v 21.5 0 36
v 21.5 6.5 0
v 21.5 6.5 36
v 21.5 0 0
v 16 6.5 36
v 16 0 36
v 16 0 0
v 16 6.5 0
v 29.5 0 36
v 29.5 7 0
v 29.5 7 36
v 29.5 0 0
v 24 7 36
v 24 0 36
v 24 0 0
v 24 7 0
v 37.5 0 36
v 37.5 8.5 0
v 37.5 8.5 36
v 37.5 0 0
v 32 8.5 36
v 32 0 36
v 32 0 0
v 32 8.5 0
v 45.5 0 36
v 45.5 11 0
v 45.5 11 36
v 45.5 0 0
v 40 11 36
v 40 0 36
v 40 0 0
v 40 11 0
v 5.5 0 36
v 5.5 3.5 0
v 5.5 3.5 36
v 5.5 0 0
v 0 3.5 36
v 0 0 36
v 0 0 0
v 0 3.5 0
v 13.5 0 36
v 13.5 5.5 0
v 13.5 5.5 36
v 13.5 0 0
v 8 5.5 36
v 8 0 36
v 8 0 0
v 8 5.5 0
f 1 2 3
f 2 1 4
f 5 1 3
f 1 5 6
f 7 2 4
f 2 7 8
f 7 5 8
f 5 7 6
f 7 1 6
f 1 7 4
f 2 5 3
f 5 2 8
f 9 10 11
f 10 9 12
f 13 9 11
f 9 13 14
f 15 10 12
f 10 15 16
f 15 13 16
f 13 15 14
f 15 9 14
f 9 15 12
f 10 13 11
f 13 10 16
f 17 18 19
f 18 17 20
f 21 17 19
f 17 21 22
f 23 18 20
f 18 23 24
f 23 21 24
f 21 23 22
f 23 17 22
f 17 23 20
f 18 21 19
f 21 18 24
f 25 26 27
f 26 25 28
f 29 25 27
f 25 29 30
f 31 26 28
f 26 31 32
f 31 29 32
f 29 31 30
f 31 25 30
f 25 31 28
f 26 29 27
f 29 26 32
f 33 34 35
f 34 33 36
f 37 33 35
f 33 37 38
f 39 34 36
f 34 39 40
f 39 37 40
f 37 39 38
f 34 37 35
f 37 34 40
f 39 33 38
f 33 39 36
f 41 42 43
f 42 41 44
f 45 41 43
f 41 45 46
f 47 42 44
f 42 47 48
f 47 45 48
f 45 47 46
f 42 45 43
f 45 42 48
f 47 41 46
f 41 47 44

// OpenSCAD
// Use `Top View'.

// All distances are in inches.

// COMPONENTS:

module six_by_six()
{
    color ("LightGrey")
        cube ([5.5,5.5,3*12]);
}
module four_by_six()
{
    color ("LightGrey")
        cube ([5.5,3.5,3*12]);
}
module two_by_six()
{
    color ("LightGrey")
        cube ([5.5,1.5,3*12]);
}

// ASSEMBLIES:

module small_single()
{
    four_by_six();
}
module single()
{
    six_by_six();
}
module single_plus_one()
{
    six_by_six();
    translate ([0, 5.5]) two_by_six();
}
module single_plus_two()
{
    six_by_six();
    translate ([0, 5.5]) two_by_six();
    translate ([0, 7.0]) two_by_six();
}
module small_plus_two()
{
    four_by_six();
    translate ([0, 3.5]) two_by_six();
    translate ([0, 5.0]) two_by_six();
}
module double()
{
    six_by_six();
    translate ([0, 5.5]) six_by_six();
}
step = 8;
translate ([0*step,0]) small_single();
translate ([1*step,0]) single();
translate ([2*step,0]) small_plus_two();
translate ([3*step,0]) single_plus_one();
translate ([4*step,0]) single_plus_two();
translate ([5*step,0]) double();
